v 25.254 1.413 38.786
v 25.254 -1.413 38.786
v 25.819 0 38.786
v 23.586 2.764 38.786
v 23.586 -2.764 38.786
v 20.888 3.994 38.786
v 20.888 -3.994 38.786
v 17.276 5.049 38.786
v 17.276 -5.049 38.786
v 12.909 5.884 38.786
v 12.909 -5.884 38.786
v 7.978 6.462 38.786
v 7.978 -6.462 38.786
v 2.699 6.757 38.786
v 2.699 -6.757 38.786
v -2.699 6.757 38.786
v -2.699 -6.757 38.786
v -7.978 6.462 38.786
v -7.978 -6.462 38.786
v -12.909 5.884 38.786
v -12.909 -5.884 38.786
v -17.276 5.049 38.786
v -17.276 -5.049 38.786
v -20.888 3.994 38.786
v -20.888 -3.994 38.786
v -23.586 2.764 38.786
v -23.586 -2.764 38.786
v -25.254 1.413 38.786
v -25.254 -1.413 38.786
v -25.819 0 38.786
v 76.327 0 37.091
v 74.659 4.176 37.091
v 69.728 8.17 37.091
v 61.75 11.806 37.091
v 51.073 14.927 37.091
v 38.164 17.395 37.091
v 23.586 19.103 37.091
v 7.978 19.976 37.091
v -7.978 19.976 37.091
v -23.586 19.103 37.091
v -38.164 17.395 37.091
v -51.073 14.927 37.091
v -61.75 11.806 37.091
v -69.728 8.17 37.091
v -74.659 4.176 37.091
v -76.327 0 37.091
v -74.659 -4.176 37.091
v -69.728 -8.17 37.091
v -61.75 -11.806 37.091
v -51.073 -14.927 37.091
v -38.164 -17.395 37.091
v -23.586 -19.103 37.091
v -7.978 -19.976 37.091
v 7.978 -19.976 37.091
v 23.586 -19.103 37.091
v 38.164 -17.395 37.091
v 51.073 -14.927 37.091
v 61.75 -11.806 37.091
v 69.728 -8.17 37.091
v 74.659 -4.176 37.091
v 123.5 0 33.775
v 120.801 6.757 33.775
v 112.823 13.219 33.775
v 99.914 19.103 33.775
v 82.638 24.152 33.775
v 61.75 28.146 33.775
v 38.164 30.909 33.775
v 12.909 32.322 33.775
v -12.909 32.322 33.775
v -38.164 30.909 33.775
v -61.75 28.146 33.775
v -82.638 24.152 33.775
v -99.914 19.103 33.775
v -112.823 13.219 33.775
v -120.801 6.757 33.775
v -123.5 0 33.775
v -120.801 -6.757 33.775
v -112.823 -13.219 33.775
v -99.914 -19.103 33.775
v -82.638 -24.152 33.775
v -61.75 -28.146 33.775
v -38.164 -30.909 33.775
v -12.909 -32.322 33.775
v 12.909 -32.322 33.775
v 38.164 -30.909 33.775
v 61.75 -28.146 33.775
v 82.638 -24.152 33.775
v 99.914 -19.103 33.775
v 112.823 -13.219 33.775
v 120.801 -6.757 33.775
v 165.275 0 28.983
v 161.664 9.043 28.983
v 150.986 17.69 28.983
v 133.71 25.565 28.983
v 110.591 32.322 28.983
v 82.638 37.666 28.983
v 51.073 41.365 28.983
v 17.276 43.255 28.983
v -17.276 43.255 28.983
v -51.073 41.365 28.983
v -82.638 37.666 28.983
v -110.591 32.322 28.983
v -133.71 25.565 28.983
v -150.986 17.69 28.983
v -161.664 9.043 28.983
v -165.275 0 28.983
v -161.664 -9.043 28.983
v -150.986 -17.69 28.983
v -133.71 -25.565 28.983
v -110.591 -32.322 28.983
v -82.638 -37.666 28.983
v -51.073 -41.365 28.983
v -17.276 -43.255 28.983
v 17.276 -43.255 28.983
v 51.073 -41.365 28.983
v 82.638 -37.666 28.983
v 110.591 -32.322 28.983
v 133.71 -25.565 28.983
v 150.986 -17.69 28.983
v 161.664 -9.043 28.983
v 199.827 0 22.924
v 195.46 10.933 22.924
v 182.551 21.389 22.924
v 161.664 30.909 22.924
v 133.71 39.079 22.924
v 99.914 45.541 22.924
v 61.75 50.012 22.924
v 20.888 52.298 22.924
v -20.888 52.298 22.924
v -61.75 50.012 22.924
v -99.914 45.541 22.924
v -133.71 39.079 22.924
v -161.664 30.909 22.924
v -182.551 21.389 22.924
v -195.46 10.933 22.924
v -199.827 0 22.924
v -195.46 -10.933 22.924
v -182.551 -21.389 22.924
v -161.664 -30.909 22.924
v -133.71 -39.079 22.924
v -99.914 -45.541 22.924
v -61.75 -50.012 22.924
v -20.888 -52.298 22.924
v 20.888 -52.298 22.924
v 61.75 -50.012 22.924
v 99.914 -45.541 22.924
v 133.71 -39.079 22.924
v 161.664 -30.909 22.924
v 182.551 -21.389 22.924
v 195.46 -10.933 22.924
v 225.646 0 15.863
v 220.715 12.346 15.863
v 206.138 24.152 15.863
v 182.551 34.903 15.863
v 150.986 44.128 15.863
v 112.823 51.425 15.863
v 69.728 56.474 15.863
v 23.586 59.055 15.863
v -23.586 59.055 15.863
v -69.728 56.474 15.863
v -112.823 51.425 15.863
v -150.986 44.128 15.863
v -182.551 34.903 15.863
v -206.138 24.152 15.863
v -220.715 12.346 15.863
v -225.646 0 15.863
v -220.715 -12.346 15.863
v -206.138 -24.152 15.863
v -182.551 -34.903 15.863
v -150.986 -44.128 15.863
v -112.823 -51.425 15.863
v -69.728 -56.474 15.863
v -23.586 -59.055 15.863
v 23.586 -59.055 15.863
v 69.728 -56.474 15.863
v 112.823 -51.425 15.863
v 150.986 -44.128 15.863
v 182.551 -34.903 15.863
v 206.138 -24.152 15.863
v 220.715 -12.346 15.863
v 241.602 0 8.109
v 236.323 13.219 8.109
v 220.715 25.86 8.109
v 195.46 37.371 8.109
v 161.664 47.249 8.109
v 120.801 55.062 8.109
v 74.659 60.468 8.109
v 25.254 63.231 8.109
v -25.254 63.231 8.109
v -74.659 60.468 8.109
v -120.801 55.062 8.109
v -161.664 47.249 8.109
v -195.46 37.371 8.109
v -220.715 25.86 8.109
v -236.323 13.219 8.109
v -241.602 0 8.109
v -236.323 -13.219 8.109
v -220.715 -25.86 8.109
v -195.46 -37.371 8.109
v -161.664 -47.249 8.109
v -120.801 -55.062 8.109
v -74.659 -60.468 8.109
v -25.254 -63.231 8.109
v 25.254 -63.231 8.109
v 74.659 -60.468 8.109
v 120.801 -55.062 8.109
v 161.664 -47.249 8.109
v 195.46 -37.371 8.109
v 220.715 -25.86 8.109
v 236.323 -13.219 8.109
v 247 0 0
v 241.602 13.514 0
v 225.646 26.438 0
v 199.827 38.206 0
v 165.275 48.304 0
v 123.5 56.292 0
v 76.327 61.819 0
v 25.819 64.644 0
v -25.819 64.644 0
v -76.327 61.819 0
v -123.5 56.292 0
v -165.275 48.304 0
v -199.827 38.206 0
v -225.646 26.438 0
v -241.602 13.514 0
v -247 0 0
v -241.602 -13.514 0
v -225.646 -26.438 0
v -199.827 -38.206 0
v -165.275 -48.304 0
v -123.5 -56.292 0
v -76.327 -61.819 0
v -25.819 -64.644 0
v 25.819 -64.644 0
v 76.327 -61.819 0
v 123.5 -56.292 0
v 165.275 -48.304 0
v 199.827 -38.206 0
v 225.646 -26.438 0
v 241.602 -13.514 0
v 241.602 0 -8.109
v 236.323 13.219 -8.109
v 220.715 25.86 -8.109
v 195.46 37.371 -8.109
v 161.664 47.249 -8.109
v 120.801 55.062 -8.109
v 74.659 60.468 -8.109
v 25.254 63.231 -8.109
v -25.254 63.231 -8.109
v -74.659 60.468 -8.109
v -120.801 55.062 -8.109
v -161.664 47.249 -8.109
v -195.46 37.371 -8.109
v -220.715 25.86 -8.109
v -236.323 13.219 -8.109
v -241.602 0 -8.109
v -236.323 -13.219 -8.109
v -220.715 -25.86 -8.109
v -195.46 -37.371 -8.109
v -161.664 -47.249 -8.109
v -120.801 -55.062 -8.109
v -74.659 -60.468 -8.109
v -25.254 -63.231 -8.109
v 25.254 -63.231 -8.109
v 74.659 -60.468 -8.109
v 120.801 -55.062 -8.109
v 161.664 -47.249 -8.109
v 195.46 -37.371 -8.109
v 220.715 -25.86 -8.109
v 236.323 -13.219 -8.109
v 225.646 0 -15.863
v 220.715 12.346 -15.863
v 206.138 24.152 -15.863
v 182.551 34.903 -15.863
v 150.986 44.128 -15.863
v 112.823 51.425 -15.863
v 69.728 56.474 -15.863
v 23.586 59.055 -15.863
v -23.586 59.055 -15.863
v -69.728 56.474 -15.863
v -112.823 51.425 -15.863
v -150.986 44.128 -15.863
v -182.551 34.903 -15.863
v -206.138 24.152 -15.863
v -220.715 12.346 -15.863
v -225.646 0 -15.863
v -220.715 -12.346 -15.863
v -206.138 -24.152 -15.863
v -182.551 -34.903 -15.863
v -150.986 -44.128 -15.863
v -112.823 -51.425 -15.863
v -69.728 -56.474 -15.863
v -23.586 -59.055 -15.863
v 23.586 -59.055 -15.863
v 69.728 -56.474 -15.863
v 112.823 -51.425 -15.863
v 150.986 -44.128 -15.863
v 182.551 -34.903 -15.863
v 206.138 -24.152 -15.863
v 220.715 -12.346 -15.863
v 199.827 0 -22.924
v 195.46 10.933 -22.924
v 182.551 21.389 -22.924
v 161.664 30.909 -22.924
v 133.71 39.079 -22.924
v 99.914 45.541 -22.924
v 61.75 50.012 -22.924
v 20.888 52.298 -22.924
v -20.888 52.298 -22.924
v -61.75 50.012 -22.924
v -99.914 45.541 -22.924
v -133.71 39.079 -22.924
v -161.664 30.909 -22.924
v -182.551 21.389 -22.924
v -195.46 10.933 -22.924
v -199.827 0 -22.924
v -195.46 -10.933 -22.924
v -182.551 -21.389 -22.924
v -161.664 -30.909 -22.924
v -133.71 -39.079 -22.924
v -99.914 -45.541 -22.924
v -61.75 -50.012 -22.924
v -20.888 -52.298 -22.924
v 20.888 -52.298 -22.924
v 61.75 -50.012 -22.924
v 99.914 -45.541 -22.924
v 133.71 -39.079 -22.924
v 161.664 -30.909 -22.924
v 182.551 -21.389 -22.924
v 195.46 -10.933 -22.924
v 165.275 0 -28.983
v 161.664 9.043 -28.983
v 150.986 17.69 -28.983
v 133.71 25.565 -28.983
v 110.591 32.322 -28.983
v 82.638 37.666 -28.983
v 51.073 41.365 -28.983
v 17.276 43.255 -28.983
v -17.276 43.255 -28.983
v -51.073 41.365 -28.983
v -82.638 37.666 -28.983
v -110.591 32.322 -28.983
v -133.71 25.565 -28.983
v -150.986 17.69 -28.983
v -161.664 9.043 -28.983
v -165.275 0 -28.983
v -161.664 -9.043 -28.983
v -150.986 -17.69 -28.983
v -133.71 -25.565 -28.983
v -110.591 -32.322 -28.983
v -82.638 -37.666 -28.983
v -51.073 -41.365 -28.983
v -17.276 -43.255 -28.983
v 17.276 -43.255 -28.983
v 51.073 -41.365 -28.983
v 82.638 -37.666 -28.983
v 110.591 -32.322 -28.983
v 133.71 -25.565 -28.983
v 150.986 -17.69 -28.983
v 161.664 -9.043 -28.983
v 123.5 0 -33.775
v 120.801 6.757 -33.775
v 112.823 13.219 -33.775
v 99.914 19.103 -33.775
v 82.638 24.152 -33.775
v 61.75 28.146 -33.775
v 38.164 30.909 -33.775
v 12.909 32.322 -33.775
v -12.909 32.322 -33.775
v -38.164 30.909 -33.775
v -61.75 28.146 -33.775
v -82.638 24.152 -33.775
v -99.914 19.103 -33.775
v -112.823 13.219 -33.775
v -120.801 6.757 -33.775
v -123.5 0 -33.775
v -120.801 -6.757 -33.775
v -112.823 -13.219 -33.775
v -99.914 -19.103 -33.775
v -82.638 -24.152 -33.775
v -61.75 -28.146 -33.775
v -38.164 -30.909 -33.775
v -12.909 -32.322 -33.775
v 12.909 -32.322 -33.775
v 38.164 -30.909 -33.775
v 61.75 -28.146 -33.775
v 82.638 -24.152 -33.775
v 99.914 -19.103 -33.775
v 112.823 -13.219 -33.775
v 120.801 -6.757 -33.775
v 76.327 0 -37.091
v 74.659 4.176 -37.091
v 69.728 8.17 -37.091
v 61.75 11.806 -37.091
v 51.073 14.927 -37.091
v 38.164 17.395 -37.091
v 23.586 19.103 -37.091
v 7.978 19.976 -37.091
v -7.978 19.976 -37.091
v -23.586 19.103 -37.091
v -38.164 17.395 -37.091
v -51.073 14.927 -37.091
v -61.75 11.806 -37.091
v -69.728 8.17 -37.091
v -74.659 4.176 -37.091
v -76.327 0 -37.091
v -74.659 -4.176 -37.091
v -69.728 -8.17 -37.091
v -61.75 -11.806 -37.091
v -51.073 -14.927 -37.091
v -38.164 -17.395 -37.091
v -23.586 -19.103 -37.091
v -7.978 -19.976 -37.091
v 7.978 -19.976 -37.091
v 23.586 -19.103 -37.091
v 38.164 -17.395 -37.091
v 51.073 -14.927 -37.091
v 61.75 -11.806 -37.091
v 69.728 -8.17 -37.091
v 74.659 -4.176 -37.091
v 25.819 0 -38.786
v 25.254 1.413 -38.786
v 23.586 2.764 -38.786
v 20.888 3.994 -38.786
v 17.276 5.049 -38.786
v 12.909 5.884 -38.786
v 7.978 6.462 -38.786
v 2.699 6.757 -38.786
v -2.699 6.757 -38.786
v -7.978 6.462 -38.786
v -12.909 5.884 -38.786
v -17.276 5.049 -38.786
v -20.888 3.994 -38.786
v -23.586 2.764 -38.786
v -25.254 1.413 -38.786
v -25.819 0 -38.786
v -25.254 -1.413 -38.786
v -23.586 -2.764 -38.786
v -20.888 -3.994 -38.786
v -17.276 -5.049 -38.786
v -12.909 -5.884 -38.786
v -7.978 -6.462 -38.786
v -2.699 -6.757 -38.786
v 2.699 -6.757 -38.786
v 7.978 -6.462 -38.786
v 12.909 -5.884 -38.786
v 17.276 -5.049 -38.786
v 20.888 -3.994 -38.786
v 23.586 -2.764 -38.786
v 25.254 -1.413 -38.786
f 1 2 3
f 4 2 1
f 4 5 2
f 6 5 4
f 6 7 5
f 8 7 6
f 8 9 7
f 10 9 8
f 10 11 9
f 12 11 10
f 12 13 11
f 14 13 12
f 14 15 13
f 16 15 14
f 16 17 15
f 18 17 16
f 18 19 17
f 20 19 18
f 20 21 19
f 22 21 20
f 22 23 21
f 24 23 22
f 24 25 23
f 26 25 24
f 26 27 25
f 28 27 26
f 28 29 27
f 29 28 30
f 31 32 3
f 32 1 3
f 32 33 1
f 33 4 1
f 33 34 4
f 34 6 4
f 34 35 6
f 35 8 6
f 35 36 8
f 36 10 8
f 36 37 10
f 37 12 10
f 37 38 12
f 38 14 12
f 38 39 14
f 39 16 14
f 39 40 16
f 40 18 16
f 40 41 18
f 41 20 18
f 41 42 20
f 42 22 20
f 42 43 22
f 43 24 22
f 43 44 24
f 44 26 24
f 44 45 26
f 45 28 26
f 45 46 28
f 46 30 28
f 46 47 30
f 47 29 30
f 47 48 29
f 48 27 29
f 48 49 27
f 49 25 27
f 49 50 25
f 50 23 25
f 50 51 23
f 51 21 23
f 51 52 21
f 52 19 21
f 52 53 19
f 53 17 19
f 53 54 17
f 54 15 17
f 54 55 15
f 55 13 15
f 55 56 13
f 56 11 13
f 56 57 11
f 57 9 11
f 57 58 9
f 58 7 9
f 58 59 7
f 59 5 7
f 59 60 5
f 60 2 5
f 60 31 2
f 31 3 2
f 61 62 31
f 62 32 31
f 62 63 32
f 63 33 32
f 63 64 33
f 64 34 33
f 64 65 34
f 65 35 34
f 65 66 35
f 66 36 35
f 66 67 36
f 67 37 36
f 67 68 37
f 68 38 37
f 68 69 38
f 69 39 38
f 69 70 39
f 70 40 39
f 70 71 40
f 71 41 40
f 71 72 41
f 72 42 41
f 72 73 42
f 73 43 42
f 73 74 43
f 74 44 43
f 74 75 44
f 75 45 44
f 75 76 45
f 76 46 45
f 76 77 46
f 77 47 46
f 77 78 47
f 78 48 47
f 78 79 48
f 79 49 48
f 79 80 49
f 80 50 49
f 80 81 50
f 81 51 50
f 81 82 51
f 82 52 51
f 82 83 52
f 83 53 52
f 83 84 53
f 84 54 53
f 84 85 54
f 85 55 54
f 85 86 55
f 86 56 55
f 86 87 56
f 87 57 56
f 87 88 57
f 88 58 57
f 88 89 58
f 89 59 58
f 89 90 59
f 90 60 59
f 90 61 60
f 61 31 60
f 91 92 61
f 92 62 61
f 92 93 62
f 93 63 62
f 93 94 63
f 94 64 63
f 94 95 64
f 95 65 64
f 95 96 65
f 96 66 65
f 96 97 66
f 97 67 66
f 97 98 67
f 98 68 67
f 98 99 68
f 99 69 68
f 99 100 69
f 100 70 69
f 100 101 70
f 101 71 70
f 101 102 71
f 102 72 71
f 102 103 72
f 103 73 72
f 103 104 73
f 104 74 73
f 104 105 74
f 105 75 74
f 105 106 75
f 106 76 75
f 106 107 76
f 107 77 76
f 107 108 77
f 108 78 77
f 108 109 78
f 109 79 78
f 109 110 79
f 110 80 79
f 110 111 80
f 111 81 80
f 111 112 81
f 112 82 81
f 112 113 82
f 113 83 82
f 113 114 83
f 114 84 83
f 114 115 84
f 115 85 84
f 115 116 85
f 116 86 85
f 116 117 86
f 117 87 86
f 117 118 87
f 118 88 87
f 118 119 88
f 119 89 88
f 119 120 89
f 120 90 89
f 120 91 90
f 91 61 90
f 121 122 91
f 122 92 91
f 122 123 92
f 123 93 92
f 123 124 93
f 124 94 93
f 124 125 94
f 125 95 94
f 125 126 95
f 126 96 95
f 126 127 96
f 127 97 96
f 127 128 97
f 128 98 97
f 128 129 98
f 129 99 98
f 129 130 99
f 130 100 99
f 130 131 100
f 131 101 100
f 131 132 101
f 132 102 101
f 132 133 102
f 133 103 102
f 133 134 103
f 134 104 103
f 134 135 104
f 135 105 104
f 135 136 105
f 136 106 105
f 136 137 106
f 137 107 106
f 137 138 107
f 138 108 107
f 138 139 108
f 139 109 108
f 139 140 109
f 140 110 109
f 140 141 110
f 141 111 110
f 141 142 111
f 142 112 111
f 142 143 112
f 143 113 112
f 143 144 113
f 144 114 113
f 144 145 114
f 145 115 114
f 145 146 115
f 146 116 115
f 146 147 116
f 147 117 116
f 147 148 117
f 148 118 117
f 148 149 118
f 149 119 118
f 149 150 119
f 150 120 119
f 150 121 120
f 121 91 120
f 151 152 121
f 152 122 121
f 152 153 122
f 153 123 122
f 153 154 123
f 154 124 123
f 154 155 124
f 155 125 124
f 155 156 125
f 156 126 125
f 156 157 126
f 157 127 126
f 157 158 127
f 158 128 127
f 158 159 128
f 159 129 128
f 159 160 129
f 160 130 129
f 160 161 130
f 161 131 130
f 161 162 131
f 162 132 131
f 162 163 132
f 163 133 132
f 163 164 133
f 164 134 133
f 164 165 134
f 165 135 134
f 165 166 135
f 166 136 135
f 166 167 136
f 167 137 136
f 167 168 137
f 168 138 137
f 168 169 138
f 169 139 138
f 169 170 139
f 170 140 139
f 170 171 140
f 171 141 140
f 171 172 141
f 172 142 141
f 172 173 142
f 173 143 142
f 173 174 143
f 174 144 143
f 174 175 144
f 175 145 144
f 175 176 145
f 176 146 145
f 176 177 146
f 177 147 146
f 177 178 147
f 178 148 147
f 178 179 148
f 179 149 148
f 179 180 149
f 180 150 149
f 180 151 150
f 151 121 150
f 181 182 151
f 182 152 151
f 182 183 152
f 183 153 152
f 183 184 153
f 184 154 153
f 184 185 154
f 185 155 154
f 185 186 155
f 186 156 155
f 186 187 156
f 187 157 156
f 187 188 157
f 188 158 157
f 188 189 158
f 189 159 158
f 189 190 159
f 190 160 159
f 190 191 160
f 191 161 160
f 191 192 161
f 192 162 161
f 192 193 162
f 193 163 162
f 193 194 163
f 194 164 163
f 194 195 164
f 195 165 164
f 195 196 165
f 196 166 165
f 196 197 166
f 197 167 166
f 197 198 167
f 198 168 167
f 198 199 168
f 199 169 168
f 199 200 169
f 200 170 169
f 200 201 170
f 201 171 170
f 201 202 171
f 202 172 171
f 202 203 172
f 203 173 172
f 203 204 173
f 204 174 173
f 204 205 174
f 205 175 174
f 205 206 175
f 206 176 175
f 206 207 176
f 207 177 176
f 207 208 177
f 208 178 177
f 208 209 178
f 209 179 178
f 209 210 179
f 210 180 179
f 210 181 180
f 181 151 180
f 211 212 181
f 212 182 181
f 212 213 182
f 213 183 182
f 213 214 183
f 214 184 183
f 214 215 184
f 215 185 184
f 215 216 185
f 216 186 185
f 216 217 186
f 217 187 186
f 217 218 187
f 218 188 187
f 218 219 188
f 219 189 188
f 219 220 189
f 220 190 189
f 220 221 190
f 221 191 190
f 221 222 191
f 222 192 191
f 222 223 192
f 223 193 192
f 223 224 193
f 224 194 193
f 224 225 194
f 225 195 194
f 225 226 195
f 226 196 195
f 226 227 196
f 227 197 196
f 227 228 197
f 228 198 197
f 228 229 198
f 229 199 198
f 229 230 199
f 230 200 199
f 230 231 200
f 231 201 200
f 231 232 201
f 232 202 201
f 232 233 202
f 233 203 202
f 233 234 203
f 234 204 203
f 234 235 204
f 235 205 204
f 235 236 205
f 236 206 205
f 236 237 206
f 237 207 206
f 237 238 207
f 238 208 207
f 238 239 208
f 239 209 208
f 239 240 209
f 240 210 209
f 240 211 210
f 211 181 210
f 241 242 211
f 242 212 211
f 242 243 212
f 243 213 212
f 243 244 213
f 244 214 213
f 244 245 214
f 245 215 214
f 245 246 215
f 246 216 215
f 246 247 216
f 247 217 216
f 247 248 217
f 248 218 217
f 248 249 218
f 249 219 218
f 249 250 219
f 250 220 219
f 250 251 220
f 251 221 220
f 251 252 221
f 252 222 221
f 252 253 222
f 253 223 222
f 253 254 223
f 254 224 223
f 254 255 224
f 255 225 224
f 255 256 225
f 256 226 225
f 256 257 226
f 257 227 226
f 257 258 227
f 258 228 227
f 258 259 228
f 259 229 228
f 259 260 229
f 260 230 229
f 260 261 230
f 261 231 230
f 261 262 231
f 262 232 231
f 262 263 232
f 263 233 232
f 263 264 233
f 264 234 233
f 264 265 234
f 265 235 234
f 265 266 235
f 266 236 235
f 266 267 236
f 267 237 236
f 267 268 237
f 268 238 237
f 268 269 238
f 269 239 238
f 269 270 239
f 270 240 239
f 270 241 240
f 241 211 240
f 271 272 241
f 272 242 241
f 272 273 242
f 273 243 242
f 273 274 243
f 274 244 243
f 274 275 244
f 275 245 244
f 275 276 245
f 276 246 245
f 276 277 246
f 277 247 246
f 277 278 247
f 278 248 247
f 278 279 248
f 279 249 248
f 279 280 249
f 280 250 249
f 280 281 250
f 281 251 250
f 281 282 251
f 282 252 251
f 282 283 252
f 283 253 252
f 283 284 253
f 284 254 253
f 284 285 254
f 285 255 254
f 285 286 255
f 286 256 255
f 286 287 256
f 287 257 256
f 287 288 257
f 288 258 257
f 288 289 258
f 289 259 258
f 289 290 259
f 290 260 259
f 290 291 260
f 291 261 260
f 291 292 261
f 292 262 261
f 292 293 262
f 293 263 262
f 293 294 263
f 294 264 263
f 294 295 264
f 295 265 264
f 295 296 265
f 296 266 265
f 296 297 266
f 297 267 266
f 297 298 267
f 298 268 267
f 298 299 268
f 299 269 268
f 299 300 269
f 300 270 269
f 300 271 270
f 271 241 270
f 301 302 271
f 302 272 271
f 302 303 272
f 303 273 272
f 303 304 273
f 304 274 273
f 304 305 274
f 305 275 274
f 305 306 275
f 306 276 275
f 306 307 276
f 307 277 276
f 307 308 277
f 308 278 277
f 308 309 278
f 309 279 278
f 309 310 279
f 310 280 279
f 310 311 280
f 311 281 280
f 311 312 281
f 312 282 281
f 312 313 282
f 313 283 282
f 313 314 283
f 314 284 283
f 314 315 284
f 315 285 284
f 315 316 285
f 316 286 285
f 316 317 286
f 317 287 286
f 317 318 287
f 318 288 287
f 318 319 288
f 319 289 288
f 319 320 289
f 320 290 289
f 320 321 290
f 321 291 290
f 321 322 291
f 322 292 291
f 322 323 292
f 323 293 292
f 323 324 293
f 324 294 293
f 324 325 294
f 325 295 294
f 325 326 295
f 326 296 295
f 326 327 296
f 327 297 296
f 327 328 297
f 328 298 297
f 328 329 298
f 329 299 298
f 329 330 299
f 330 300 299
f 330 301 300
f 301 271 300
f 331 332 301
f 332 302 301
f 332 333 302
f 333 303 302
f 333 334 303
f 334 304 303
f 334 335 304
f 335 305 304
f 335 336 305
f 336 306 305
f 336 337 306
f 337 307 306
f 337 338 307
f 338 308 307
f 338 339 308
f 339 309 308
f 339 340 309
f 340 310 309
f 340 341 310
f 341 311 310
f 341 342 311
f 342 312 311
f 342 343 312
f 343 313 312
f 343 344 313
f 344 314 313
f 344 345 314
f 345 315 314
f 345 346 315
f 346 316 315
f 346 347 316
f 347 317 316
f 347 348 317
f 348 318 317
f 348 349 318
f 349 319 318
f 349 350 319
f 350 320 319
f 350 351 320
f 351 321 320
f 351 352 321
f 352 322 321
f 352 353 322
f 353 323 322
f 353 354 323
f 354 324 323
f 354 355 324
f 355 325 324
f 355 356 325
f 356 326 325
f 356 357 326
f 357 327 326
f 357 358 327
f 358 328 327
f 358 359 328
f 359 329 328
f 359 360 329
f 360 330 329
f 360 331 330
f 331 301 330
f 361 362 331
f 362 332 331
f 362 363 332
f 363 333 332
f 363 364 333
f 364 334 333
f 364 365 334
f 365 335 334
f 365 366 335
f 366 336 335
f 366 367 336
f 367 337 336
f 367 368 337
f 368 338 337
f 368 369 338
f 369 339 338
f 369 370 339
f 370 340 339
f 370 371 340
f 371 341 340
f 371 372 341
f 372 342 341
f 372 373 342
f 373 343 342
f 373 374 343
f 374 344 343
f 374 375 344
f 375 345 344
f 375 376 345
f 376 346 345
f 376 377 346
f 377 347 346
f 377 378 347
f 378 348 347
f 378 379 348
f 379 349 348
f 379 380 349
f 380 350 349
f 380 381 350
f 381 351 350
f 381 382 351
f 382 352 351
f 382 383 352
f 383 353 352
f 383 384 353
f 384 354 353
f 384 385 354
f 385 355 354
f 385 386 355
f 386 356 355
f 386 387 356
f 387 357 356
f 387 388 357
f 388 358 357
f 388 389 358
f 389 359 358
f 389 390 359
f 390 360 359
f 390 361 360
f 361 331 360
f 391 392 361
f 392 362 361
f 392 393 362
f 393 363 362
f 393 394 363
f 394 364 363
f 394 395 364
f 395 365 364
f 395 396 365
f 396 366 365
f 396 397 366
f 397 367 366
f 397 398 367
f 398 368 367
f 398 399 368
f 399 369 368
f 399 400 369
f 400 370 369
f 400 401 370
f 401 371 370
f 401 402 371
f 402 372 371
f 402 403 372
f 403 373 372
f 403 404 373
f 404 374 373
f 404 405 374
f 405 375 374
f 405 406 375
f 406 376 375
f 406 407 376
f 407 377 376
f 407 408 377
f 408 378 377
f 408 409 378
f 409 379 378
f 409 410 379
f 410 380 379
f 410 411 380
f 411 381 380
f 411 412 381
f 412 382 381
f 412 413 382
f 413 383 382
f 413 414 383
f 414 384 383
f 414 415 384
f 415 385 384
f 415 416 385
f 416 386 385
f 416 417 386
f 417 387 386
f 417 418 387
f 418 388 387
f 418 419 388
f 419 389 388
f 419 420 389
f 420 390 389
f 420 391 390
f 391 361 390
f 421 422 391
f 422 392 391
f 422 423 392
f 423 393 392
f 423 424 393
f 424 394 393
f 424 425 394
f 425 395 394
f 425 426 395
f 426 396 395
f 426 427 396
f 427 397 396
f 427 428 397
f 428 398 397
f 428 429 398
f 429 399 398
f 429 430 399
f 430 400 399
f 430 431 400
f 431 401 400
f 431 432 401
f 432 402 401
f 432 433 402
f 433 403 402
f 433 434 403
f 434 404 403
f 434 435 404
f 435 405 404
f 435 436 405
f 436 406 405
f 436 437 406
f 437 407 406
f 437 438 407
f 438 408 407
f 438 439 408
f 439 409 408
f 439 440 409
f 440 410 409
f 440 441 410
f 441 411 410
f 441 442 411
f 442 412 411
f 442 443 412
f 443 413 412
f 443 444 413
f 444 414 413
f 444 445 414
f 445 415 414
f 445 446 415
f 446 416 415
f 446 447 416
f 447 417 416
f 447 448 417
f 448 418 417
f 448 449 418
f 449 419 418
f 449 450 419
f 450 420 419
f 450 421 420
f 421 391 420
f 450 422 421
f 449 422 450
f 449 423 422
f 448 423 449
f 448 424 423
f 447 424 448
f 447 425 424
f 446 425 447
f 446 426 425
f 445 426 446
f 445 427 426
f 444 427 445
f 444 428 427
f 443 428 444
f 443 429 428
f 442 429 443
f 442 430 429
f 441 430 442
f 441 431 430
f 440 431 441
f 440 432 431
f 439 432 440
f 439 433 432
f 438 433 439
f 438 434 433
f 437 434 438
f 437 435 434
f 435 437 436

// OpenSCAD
// Generated by SolidPython 1.0.1 on 2020-07-29 00:46:53


scale(v = [19, 5, 3]) {
	sphere(r = 13);
}
/***********************************************
*********      SolidPython code:      **********
************************************************
 
# import packages: SolidPython
from solid import *
from solid.utils import *
from itertools import chain, combinations, permutations


class Resize:

    def __init__(self, scad_file):
        self.scad_file = scad_file
        #self.scad_file = import_scad(scad_file)
        # cone/cylinder param:
        self.r1 = 0
        self.r2 = 0
        self.h = 0
        # rectangular prism param:
        self.w = 0
        self.l = 0
        # ellipse param:
        self.r = 0

    # import OpenScad code (file name corresponds to shape)


    # classify shape + parameters
    def assign(self, param1, param2, param3):
        if self.scad_file == 'cone.scad':
            self.r1 = param1
            self.r2 = param2
            self.h = param3
        elif self.scad_file == 'cylinder.scad':
            self.r1 = param1
            self.r2 = param2
            self.h = param3
        elif self.scad_file == 'rectangularPrism.scad':
            self.h = param1
            self.l = param2
            self.w = param3
        else:
            self.r = param1
            self.h = param2

    # resize parameters
    def iterate(self):
        x = range(3, 20, 2)
        i = 1
        if self.scad_file == 'cone.scad':
            tempList = list(permutations(x, 2))
            for temp in tempList:
                param1 = temp[0]
                param2 = temp[1]
                filepath = 'produced_scad_files/' + 'cone' + str(param1) + '_' + str(param2) + '_' + '.scad'
                scad_render_to_file(cylinder(h=param1, r1=param2, r2=0), filepath)

        elif self.scad_file == 'cylinder.scad':
            tempList = list(permutations(x, 3))
            for temp in tempList:
                param1 = temp[0]
                param2 = temp[1]
                filepath = 'produced_scad_files/' + 'cylinder' + str(param1) + '_' + str(param2) + '_' + '.scad'
                scad_render_to_file(cylinder(h=param1, r1=param2, r2=param2), filepath)

        elif self.scad_file == 'rectangularPrism.scad':
            tempList = list(permutations(x, 3))
            for temp in tempList:
                param1 = temp[0]
                param2 = temp[1]
                param3 = temp[2]
                filepath = 'produced_scad_files/' + 'rectangularPrism' + str(param1) + '_' + str(param2) + '_' + str(
                    param3) + '.scad'
                scad_render_to_file(cube(size=(param1, param2, param3)), filepath)

        elif self.scad_file == 'ellipse.scad':
            tempList = list(permutations(x, 4))
            for temp in tempList:
                param1 = temp[0]
                param2 = temp[1]
                param3 = temp[2]
                param4 = temp[3]
                filepath = 'produced_scad_files/' + 'ellipse' + str(param1) + '_' + str(param2) + '_' + str(param3) + '_' + str(param4) + '.scad'
                scad_render_to_file(scale([param1, param2, param3])(sphere(r=param4)), filepath)

    def render_to_scadfile(self):
        scad_render_to_file(scad, 'example.scad') 
 
************************************************/
